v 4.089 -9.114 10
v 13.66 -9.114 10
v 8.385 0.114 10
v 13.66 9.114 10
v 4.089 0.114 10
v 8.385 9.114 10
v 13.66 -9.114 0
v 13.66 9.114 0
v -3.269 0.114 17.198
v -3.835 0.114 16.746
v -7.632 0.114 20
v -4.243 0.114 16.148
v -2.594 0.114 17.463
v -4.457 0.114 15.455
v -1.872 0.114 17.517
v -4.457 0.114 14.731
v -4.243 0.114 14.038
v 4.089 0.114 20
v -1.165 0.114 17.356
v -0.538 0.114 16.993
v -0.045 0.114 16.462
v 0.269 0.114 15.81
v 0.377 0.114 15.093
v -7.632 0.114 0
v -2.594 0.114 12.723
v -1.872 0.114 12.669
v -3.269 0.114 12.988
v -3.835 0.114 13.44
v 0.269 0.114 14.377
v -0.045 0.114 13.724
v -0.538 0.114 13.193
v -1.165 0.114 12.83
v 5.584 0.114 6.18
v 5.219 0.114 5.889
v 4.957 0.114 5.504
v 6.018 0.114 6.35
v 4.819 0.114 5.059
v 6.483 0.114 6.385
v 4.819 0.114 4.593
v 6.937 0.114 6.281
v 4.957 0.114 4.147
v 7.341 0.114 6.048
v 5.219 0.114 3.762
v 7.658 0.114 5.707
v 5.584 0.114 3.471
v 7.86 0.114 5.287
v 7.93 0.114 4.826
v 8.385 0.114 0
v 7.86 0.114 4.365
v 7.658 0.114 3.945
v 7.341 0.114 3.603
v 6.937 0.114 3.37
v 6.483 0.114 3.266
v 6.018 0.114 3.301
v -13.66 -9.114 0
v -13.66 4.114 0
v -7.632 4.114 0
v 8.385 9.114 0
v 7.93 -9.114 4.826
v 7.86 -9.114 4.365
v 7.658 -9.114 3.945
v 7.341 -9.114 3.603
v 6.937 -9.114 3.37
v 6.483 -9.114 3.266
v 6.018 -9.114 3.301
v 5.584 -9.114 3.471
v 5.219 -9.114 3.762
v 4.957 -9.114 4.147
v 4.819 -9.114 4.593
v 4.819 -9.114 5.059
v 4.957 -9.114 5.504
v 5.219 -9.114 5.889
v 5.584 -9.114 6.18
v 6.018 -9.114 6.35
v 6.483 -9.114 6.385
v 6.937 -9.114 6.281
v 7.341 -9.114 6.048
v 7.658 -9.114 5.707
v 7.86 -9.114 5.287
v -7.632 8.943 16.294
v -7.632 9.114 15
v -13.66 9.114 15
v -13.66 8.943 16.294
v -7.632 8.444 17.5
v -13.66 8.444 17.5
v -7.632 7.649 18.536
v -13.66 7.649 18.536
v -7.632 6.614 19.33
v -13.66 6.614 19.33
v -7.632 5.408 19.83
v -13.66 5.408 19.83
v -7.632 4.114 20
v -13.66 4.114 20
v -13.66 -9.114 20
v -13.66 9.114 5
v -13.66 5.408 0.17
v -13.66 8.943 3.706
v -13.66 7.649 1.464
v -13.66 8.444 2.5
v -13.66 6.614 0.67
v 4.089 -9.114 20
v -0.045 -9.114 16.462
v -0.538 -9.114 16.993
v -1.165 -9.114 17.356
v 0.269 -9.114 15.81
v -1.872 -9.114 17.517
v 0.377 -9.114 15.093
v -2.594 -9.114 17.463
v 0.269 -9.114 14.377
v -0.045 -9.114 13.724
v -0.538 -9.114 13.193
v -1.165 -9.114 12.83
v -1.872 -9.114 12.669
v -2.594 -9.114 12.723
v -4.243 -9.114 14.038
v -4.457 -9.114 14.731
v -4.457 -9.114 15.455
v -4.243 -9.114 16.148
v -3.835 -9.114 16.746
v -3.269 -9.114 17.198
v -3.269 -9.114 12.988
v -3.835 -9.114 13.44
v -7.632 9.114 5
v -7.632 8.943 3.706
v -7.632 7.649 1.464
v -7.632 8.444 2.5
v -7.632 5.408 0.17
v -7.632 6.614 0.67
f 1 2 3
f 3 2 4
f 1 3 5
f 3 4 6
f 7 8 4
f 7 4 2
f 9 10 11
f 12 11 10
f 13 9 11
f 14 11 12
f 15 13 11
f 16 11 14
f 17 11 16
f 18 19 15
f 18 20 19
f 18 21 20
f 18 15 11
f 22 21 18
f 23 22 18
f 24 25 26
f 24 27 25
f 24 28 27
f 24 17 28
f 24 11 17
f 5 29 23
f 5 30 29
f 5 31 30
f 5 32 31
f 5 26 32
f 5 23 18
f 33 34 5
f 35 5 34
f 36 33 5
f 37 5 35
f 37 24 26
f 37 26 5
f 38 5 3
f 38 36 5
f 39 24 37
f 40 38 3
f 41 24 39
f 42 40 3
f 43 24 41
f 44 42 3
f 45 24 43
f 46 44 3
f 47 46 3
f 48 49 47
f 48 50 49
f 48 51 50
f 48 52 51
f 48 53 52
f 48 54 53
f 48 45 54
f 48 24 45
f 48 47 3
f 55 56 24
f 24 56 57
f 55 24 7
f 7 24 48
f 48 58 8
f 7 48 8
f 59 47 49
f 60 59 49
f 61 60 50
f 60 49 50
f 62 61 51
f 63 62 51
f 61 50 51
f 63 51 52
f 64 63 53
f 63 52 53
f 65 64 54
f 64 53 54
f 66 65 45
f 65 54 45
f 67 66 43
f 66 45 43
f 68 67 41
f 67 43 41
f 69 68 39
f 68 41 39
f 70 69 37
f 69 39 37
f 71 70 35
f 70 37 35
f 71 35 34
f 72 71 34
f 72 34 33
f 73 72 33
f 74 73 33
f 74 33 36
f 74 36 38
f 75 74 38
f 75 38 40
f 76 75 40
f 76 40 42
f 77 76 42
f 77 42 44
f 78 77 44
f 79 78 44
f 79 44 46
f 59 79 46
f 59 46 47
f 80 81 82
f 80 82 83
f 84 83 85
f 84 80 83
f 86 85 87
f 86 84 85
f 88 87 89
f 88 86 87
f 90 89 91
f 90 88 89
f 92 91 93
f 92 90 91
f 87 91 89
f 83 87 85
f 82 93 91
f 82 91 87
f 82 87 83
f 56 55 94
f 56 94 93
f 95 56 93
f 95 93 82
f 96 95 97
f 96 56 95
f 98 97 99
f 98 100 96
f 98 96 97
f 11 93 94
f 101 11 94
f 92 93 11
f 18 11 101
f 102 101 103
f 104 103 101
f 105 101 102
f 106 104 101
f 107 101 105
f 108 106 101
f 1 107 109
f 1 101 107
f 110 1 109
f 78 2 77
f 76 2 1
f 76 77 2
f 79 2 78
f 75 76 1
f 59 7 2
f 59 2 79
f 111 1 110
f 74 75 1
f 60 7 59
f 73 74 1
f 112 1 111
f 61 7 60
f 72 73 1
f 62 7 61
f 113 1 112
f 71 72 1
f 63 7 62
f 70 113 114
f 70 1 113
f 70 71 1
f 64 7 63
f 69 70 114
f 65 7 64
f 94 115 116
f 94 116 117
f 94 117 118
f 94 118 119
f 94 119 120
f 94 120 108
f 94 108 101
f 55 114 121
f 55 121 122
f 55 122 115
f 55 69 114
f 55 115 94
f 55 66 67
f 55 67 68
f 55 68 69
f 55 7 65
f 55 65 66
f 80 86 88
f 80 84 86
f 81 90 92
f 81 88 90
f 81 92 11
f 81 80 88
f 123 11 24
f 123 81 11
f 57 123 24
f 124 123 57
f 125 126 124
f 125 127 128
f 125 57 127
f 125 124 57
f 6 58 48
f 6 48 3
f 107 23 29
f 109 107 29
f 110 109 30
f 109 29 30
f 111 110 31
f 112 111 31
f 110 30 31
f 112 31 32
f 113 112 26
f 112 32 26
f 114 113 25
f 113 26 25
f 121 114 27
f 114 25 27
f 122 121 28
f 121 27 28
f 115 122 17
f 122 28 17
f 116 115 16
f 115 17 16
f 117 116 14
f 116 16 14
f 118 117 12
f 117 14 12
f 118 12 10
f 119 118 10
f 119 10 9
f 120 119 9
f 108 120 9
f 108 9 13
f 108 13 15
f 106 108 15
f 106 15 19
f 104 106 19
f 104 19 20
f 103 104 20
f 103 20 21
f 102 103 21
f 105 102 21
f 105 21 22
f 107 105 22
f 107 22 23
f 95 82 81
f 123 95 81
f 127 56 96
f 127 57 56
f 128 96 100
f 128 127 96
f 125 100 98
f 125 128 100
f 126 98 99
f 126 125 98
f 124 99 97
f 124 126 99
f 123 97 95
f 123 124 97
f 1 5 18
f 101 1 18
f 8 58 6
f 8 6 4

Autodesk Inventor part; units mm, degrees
ref_plane "YZ Plane" through (0, 0, 0) normal (1, 0, 0) x (0, 1, 0)
ref_plane "XZ Plane" through (0, 0, 0) normal (0, 1, 0) x (-1, 0, 0)
ref_plane "XY Plane" through (0, 0, 0) normal (0, 0, 1) x (1, 0, 0)
sketch "스케치1" plane through (0, 0, 0) normal (0, 0, 1) x (1, 0, 0)
  line L0 (13.6602, -9.1135) -> (-13.6602, -9.1135)
  line L1 (-13.6602, -9.1135) -> (-13.6602, 9.1135)
  line L2 (-13.6602, 9.1135) -> (13.6602, 9.1135)
  line L3 (13.6602, 9.1135) -> (13.6602, -9.1135)
  line L4 (13.6602, -9.1135) -> (-13.6602, 9.1135) construction
  line L5 (-13.6602, -9.1135) -> (13.6602, 9.1135) construction
  point P0 (0, 0)
extrude "돌출1" add sketch "스케치1" along normal blind 20
sketch "스케치2" plane through (-13.6602, 9.1135, 0) normal (0, 1, 0) x (1, 0, 0)
  line L0 (0, -20) -> (27.3204, -20) projected
  line L1 (27.3204, 0) -> (27.3204, -20) projected
  line L2 (17.7495, -20) -> (27.3204, -20)
  line L3 (27.3204, -20) -> (27.3204, -10)
  line L4 (27.3204, -10) -> (17.7495, -10)
  line L5 (17.7495, -10) -> (17.7495, -20)
  point P0 (13.6602, 0)
extrude "돌출2" cut sketch "스케치2" against normal blind 20
sketch "스케치3" plane through (-13.6602, 9.1135, 0) normal (0, 1, 0) x (1, 0, 0)
  point P0 (13.6602, 0)
sketch "스케치4" plane through (-13.6602, 9.1135, 0) normal (0, 1, 0) x (1, 0, 0)
  line L0 (0, -20) -> (17.7495, -20) projected
  line L1 (6.0281, -20) -> (6.0281, 0)
  line L2 (27.3204, 0) -> (0, 0) projected
  line L3 (22.0453, 0) -> (22.0453, -10)
  line L4 (17.7495, -10) -> (27.3204, -10) projected
  line L5 (17.7495, -20) -> (17.7495, -10) projected
  line L6 (17.7495, -10) -> (17.7495, -20)
  line L7 (17.7495, -20) -> (6.0281, -20)
  point P0 (13.6602, 0)
extrude "돌출3" cut sketch "스케치4" against normal blind 9
sketch "스케치5" plane through (-13.6602, 0.1135, 0) normal (0, 1, 0) x (1, 0, 0)
  circle A0 centre (20.026, -4.8257) radius 1.5639
  circle A1 centre (11.6067, -15.0931) radius 2.4307
  point P0 (13.6602, 0)
extrude "돌출4" cut sketch "스케치5" against normal blind 10
fillet "모깎기1" radius 5 1 edges at (-10.6462, 9.1135, 20)
fillet "모깎기2" radius 5 1 edges at (-10.6462, 9.1135, 0)
properties part number "240503_3Dsketch11"
